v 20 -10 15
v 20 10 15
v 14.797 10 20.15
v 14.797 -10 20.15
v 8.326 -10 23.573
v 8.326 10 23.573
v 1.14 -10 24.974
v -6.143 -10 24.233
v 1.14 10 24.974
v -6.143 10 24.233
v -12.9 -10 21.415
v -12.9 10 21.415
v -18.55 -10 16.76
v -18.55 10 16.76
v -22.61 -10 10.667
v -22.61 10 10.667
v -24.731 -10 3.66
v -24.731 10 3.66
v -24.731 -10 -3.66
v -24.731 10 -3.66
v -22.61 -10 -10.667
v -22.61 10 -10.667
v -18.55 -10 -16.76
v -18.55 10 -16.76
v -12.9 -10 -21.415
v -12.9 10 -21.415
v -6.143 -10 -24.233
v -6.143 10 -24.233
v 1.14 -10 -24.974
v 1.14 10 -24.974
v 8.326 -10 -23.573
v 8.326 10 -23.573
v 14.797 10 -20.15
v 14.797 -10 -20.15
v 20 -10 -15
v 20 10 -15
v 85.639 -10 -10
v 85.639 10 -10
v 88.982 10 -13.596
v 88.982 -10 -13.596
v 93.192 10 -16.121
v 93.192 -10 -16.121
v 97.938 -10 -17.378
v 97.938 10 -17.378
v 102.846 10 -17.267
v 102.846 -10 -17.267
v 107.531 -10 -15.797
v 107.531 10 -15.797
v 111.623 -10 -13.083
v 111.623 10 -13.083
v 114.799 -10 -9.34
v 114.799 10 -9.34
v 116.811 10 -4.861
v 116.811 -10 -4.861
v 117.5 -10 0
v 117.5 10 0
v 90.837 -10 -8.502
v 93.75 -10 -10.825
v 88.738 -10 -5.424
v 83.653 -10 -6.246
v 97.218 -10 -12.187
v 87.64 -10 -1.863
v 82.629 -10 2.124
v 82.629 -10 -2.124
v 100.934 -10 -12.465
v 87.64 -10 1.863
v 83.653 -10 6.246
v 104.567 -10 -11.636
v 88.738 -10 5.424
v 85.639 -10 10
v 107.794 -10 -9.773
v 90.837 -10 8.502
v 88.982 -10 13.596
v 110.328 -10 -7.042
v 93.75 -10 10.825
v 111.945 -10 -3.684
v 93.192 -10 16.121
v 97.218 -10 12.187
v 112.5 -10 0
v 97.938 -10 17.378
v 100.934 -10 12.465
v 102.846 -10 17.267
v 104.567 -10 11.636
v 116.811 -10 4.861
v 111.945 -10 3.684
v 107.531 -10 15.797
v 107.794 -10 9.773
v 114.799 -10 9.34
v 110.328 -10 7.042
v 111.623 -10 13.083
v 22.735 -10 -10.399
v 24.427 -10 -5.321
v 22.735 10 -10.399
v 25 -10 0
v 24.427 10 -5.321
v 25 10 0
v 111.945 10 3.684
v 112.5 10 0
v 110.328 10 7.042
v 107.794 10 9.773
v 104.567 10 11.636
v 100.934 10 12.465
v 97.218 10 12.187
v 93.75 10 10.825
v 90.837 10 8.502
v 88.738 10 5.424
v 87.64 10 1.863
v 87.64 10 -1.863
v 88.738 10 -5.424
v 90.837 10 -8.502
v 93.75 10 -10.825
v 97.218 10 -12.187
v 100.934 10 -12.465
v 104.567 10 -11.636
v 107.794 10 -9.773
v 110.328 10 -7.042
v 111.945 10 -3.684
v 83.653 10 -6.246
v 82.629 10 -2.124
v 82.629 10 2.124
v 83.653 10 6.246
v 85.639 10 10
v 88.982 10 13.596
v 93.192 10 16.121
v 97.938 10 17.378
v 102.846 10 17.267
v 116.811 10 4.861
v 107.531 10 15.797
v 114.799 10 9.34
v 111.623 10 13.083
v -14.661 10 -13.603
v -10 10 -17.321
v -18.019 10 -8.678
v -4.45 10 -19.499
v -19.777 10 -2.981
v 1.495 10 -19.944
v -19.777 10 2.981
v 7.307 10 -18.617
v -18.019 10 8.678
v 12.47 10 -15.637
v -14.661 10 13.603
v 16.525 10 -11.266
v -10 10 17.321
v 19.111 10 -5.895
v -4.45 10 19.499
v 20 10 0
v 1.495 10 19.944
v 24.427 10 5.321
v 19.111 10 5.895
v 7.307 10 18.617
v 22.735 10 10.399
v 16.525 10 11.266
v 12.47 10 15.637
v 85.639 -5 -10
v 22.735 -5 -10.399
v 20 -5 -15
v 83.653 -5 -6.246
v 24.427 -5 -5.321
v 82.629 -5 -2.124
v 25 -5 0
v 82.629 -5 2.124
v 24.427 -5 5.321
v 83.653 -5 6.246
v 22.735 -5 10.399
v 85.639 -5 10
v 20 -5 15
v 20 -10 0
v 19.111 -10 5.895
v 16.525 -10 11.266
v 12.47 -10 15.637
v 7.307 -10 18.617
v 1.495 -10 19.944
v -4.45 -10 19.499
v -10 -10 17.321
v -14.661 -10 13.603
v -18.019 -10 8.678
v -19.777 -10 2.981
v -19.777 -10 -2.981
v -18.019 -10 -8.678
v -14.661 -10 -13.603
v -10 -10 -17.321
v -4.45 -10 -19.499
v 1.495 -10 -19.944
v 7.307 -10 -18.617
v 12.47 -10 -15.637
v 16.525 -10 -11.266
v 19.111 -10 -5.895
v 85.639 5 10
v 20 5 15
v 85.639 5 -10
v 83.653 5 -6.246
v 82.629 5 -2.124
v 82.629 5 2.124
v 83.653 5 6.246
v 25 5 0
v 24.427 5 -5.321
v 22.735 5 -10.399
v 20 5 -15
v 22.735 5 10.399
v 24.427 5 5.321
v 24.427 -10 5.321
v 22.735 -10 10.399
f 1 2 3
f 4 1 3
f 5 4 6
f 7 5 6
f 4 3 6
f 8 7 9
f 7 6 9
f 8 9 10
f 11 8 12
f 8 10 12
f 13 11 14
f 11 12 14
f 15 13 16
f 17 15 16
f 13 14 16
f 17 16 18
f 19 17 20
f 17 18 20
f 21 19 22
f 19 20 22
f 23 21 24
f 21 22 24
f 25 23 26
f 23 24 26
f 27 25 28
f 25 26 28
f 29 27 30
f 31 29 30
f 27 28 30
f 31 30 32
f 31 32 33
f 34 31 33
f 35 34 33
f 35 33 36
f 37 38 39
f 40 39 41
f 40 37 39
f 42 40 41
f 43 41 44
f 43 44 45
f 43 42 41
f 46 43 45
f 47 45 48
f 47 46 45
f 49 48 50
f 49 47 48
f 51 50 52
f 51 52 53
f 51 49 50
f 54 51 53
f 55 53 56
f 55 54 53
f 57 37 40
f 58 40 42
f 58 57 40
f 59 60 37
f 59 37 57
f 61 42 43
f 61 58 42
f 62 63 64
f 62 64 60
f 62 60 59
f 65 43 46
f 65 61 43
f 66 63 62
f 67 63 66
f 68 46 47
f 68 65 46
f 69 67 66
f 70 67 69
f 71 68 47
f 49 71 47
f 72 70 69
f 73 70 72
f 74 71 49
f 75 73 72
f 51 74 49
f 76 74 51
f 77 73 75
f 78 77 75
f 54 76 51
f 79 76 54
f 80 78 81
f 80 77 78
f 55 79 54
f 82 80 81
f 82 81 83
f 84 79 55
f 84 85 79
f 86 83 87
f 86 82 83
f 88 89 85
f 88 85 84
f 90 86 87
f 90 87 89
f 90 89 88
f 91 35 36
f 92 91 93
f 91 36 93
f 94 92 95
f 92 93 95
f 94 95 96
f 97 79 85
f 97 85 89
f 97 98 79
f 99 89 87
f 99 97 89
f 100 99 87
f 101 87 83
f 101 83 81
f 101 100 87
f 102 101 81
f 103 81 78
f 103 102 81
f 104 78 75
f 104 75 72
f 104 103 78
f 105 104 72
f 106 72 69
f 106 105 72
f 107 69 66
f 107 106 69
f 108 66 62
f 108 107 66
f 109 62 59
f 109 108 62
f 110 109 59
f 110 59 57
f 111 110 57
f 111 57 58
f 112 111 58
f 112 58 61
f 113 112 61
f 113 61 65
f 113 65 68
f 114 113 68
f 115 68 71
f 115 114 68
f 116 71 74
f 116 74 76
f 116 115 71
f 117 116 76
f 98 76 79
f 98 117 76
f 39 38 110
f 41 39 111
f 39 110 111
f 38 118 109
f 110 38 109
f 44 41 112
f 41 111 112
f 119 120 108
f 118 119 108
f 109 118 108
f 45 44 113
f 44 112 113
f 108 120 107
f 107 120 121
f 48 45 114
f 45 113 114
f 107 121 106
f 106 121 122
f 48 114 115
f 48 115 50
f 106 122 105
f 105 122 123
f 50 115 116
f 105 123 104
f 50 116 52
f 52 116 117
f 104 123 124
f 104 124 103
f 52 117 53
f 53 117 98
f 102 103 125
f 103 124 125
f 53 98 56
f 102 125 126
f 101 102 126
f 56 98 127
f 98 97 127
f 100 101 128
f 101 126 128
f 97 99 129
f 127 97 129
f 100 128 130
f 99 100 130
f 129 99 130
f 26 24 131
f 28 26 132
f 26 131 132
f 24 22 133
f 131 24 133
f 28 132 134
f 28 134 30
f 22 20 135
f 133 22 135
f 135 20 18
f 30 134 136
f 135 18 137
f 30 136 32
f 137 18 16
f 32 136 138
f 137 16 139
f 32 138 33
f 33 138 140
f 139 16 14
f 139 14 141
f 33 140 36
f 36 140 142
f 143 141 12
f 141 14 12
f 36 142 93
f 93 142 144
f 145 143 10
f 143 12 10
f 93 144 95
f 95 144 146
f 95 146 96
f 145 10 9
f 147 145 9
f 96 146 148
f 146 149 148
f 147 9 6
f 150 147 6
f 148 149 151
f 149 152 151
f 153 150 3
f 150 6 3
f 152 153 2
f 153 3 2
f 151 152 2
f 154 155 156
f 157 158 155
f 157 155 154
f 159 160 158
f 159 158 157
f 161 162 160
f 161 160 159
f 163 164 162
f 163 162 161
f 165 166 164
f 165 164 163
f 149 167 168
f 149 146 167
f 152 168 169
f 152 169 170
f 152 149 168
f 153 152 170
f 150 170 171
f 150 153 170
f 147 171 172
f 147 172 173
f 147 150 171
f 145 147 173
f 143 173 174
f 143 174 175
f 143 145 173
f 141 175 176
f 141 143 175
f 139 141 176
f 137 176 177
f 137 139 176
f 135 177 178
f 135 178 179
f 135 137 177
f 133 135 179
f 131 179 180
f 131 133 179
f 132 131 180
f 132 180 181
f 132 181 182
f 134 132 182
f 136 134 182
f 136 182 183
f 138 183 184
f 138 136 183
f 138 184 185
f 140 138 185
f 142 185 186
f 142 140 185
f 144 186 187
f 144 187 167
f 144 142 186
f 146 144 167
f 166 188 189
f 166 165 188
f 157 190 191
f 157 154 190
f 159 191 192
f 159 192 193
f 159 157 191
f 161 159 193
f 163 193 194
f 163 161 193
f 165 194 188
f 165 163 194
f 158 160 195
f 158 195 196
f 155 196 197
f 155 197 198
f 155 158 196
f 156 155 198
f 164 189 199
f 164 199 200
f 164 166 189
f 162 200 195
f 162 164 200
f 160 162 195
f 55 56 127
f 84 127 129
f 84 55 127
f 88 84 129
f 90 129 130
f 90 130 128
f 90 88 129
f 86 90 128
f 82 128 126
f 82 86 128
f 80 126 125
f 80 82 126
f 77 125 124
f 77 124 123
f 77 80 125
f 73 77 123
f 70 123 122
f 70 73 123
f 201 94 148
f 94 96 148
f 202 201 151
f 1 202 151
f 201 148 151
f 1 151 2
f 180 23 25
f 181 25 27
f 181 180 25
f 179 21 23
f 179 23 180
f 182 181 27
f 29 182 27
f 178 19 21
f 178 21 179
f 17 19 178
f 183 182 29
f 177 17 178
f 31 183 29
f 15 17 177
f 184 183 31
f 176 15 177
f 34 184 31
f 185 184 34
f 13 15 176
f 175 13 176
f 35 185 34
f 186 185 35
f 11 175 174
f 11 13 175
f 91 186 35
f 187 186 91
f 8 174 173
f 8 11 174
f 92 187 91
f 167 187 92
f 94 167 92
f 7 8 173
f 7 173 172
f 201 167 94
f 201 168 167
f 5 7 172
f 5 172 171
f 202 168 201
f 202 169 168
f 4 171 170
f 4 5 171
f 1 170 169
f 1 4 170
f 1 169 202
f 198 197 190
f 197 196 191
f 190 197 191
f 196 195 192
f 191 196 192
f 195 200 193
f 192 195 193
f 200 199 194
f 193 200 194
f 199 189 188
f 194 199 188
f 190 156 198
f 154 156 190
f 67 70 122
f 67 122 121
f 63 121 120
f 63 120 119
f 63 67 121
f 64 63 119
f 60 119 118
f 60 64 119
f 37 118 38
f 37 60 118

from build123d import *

# Parameters (mm, degrees)
F0_R     = 20
F0_R_2   = 12.5
F1_DEPTH = 10
F2_DEPTH = 5


with BuildPart() as f1:
    # F0 (on Front) → F1 (new body, symmetric)
    with BuildSketch(Plane.XZ):
        with BuildLine():
            ThreePointArc((20, -15), (23.717082, -7.905694), (25, 0))
            ThreePointArc((25, 0), (23.717082, 7.905694), (20, 15))
            ThreePointArc((20, 15), (-25, 0), (20, -15))
        make_face()
        Circle(F0_R, mode=Mode.SUBTRACT)
        with BuildLine():
            ThreePointArc((117.5, 0), (105.240486, 16.696925), (85.638593, 10))
            ThreePointArc((85.638593, 10), (82.5, 0), (85.638593, -10))
            ThreePointArc((85.638593, -10), (105.240486, -16.696925), (117.5, 0))
        make_face()
        with Locations((100, 0)):
            Circle(F0_R_2, mode=Mode.SUBTRACT)
    extrude(amount=F1_DEPTH, both=True)


with BuildPart() as f2:
    # F0 (on Front) → F2 (new body, symmetric)
    with BuildSketch(Plane.XZ):
        with BuildLine():
            ThreePointArc((20, 15), (23.717082, 7.905694), (25, 0))
            ThreePointArc((25, 0), (23.717082, -7.905694), (20, -15))
            Line((20, -15), (85.638593, -10))
            ThreePointArc((85.638593, -10), (82.5, 0), (85.638593, 10))
            Line((85.638593, 10), (20, 15))
        make_face()
    extrude(amount=F2_DEPTH, both=True)


solid = Compound([f1.part, f2.part])
